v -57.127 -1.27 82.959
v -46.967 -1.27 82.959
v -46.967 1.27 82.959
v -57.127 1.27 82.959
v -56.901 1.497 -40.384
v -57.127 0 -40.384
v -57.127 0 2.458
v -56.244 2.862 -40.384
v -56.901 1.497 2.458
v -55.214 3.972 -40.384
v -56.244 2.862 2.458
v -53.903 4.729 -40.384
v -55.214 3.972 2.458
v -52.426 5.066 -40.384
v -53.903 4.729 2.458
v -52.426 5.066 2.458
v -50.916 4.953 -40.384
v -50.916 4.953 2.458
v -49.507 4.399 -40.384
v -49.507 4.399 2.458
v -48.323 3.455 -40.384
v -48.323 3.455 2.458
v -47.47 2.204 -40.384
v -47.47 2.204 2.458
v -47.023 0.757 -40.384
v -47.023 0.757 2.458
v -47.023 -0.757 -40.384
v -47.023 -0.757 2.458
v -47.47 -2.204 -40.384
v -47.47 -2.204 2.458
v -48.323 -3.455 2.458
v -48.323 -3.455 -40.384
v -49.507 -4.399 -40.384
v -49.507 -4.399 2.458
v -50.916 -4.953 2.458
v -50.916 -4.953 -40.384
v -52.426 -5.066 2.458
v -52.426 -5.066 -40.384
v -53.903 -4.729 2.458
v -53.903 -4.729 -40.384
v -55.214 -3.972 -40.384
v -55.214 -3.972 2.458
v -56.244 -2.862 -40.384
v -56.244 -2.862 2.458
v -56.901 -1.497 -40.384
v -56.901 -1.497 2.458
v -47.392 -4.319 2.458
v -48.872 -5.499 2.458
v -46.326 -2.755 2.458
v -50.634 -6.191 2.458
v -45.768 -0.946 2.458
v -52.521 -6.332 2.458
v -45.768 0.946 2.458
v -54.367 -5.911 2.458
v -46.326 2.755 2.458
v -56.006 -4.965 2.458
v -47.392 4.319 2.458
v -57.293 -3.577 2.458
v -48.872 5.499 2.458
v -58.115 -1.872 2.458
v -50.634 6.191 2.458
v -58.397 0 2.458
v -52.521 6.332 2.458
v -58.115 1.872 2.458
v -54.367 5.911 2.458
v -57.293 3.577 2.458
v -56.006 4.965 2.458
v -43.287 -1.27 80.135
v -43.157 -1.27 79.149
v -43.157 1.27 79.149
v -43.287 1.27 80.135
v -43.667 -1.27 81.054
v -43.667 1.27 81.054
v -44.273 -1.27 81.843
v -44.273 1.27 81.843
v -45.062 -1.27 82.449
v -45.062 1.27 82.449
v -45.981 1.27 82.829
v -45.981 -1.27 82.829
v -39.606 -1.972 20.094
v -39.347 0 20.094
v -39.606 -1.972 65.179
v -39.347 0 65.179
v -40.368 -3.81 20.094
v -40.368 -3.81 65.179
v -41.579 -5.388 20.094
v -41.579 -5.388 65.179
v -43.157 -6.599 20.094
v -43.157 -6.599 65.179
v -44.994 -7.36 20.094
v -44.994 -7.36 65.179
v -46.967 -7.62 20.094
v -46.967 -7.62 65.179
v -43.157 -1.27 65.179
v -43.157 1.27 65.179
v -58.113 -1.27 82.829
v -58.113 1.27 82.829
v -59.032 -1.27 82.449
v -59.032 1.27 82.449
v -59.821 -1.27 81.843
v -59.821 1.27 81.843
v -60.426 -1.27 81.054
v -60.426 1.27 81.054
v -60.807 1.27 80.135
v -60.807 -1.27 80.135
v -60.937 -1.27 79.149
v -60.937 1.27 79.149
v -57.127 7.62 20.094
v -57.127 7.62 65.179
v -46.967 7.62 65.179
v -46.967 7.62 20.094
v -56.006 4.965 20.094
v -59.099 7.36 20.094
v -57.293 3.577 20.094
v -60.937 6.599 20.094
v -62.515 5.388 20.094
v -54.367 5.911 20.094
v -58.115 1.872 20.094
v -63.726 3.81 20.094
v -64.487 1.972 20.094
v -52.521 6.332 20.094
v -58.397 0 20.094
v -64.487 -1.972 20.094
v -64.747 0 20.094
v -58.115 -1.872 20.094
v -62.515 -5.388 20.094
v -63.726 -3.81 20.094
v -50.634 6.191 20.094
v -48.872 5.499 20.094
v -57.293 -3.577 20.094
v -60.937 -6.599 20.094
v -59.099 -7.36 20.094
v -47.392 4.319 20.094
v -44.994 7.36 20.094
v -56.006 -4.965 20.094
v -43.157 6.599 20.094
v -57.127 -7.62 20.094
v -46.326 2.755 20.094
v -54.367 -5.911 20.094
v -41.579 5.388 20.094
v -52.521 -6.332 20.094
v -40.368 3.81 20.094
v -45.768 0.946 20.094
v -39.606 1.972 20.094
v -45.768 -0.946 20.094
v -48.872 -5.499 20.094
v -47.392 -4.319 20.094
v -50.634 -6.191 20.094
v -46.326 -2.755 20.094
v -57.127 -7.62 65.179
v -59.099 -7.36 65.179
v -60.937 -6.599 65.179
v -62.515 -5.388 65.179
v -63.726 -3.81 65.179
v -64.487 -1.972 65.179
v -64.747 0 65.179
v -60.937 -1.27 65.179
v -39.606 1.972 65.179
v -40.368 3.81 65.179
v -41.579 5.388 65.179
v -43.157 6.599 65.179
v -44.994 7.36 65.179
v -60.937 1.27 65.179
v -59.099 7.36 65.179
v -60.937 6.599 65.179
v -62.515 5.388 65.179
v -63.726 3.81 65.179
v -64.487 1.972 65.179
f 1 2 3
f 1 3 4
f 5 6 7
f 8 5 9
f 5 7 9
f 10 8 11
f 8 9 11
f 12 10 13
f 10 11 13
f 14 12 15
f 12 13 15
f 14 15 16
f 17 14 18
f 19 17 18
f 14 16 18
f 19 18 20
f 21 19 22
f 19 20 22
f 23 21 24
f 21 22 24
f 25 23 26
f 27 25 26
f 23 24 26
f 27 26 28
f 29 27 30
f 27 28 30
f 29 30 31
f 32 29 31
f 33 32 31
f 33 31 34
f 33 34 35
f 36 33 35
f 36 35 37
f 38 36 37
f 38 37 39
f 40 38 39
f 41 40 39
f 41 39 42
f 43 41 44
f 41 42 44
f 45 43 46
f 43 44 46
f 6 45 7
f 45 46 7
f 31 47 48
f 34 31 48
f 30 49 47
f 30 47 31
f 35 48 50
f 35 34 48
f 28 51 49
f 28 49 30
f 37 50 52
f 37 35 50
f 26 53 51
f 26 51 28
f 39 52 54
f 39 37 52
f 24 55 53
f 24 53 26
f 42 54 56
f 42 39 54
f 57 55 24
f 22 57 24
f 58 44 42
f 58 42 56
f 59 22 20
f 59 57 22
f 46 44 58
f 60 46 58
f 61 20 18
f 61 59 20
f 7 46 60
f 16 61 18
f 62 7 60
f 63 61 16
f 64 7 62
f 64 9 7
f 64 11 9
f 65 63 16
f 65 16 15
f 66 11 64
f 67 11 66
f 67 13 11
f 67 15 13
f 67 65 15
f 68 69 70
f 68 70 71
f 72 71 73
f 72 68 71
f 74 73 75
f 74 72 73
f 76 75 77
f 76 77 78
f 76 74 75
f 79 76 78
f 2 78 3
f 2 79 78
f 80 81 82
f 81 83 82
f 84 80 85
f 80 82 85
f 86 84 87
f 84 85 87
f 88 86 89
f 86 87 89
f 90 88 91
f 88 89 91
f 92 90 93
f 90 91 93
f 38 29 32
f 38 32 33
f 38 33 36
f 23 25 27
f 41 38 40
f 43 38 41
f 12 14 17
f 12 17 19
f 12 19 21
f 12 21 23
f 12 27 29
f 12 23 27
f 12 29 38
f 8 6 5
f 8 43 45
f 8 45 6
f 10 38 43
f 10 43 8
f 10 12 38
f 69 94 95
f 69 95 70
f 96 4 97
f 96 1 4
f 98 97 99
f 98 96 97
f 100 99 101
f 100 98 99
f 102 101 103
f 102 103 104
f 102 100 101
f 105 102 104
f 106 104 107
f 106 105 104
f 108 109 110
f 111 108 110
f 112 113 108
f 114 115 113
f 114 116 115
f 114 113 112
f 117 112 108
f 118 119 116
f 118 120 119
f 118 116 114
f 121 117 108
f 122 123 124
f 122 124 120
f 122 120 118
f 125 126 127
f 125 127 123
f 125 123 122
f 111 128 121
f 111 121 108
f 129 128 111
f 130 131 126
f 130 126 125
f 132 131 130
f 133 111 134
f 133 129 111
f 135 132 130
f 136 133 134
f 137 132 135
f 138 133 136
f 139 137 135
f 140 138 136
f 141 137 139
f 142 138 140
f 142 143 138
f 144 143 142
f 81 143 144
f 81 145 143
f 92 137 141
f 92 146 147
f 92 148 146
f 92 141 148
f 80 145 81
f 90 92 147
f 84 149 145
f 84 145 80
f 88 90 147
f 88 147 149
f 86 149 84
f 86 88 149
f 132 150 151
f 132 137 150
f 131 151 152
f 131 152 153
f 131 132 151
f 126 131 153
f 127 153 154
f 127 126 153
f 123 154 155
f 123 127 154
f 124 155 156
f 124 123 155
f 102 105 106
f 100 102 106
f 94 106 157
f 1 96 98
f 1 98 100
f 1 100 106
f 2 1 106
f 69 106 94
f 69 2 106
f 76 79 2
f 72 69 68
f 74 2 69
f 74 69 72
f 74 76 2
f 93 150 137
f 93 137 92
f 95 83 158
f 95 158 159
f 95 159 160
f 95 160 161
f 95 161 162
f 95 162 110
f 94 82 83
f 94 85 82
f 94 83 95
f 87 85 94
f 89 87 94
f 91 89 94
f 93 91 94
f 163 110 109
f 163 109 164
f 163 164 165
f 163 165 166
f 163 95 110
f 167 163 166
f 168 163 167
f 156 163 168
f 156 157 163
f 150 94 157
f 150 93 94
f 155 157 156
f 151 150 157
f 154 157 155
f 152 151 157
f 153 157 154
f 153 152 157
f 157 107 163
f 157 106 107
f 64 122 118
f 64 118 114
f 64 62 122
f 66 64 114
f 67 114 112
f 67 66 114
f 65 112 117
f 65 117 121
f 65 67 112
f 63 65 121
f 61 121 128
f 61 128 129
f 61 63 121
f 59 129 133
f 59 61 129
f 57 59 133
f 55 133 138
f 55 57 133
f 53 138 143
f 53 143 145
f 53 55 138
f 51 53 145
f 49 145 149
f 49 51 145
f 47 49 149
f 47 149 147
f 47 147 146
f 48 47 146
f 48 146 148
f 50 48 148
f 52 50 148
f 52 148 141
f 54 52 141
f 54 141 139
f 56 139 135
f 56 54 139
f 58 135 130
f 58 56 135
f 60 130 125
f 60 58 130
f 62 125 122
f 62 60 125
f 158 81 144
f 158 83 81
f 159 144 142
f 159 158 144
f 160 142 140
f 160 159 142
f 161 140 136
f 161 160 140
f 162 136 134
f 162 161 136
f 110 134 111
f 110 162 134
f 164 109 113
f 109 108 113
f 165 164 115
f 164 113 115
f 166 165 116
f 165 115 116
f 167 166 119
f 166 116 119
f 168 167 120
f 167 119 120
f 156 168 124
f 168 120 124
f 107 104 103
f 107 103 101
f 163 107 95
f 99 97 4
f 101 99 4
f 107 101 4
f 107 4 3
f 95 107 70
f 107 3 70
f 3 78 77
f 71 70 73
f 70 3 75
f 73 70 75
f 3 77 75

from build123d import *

# Parameters (mm, degrees)
F1_DEPTH = 7.62
F2_DEPTH = 1.27
F0_W     = 5.08
F0_H     = 42.841874063
F5_R     = 7.61999


# Not quite as in the source:
# - a fillet or chamfer is up to 0.001 mm smaller than in the source, because OpenCascade refuses the exact size


with BuildPart() as f1:
    # F0 (on Front) → F1 (new body, symmetric)
    with BuildSketch(Plane.XZ):
        Polygon((-45.6967013121, 20.0940572381), (-39.3467013121, 20.0940572381), (-39.3467013121, 65.1790572381), (-43.1567013121, 65.1790572381), (-60.9367013121, 65.1790572381), (-64.7467013121, 65.1790572381), (-64.7467013121, 20.0940572381), (-58.3967013121, 20.0940572381), (-52.0467013121, 20.0940572381), align=None)
    extrude(amount=F1_DEPTH, both=True)

    # F0 (on Front) → F2 (join, symmetric)
    with BuildSketch(Plane.XZ):
        with BuildLine():
            Line((-60.9367013121, 65.1790572381), (-43.1567013121, 65.1790572381))
            Line((-43.1567013121, 65.1790572381), (-43.1567013121, 79.1490572381))
            ThreePointArc((-43.1567013121, 79.1490572381), (-44.2726244757, 81.8431340744), (-46.9667013121, 82.9590572381))
            Line((-46.9667013121, 82.9590572381), (-57.1267013121, 82.9590572381))
            ThreePointArc((-57.1267013121, 82.9590572381), (-59.8207781484, 81.8431340744), (-60.9367013121, 79.1490572381))
            Line((-60.9367013121, 79.1490572381), (-60.9367013121, 65.1790572381))
        make_face()
    extrude(amount=F2_DEPTH, both=True)

    # F0 (on Front) → F3 (revolve)
    with BuildSketch(Plane.XZ):
        Polygon((-52.0467013121, 2.457652241), (-52.0467013121, 20.0940572381), (-58.3967013121, 20.0940572381), (-58.3967013121, 2.457652241), (-57.1267013121, 2.457652241), align=None)
    revolve(axis=Axis((-52.0467013121, 0, -10.145082292), (0, 0, -1)))

    # F0 (on Front) → F4 (revolve)
    with BuildSketch(Plane.XZ):
        with Locations((-54.5867013121, -18.9632847905)):
            Rectangle(F0_W, F0_H)
    revolve(axis=Axis((-52.0467013121, 0, -10.145082292), (0, 0, -1)))

    # F5 (radius 7.62 in the source; OpenCascade refuses exactly that, so slightly less here)
    f5_edges = [f1.edges().sort_by_distance(p)[0] for p in [
        (-39.346701, 7.62, 42.636557),
        (-64.746701, 7.62, 42.636557),
        (-64.746701, -7.62, 42.636557),
        (-39.346701, -7.62, 42.636557),
    ]]
    fillet(f5_edges, radius=F5_R)


solid = f1.part
